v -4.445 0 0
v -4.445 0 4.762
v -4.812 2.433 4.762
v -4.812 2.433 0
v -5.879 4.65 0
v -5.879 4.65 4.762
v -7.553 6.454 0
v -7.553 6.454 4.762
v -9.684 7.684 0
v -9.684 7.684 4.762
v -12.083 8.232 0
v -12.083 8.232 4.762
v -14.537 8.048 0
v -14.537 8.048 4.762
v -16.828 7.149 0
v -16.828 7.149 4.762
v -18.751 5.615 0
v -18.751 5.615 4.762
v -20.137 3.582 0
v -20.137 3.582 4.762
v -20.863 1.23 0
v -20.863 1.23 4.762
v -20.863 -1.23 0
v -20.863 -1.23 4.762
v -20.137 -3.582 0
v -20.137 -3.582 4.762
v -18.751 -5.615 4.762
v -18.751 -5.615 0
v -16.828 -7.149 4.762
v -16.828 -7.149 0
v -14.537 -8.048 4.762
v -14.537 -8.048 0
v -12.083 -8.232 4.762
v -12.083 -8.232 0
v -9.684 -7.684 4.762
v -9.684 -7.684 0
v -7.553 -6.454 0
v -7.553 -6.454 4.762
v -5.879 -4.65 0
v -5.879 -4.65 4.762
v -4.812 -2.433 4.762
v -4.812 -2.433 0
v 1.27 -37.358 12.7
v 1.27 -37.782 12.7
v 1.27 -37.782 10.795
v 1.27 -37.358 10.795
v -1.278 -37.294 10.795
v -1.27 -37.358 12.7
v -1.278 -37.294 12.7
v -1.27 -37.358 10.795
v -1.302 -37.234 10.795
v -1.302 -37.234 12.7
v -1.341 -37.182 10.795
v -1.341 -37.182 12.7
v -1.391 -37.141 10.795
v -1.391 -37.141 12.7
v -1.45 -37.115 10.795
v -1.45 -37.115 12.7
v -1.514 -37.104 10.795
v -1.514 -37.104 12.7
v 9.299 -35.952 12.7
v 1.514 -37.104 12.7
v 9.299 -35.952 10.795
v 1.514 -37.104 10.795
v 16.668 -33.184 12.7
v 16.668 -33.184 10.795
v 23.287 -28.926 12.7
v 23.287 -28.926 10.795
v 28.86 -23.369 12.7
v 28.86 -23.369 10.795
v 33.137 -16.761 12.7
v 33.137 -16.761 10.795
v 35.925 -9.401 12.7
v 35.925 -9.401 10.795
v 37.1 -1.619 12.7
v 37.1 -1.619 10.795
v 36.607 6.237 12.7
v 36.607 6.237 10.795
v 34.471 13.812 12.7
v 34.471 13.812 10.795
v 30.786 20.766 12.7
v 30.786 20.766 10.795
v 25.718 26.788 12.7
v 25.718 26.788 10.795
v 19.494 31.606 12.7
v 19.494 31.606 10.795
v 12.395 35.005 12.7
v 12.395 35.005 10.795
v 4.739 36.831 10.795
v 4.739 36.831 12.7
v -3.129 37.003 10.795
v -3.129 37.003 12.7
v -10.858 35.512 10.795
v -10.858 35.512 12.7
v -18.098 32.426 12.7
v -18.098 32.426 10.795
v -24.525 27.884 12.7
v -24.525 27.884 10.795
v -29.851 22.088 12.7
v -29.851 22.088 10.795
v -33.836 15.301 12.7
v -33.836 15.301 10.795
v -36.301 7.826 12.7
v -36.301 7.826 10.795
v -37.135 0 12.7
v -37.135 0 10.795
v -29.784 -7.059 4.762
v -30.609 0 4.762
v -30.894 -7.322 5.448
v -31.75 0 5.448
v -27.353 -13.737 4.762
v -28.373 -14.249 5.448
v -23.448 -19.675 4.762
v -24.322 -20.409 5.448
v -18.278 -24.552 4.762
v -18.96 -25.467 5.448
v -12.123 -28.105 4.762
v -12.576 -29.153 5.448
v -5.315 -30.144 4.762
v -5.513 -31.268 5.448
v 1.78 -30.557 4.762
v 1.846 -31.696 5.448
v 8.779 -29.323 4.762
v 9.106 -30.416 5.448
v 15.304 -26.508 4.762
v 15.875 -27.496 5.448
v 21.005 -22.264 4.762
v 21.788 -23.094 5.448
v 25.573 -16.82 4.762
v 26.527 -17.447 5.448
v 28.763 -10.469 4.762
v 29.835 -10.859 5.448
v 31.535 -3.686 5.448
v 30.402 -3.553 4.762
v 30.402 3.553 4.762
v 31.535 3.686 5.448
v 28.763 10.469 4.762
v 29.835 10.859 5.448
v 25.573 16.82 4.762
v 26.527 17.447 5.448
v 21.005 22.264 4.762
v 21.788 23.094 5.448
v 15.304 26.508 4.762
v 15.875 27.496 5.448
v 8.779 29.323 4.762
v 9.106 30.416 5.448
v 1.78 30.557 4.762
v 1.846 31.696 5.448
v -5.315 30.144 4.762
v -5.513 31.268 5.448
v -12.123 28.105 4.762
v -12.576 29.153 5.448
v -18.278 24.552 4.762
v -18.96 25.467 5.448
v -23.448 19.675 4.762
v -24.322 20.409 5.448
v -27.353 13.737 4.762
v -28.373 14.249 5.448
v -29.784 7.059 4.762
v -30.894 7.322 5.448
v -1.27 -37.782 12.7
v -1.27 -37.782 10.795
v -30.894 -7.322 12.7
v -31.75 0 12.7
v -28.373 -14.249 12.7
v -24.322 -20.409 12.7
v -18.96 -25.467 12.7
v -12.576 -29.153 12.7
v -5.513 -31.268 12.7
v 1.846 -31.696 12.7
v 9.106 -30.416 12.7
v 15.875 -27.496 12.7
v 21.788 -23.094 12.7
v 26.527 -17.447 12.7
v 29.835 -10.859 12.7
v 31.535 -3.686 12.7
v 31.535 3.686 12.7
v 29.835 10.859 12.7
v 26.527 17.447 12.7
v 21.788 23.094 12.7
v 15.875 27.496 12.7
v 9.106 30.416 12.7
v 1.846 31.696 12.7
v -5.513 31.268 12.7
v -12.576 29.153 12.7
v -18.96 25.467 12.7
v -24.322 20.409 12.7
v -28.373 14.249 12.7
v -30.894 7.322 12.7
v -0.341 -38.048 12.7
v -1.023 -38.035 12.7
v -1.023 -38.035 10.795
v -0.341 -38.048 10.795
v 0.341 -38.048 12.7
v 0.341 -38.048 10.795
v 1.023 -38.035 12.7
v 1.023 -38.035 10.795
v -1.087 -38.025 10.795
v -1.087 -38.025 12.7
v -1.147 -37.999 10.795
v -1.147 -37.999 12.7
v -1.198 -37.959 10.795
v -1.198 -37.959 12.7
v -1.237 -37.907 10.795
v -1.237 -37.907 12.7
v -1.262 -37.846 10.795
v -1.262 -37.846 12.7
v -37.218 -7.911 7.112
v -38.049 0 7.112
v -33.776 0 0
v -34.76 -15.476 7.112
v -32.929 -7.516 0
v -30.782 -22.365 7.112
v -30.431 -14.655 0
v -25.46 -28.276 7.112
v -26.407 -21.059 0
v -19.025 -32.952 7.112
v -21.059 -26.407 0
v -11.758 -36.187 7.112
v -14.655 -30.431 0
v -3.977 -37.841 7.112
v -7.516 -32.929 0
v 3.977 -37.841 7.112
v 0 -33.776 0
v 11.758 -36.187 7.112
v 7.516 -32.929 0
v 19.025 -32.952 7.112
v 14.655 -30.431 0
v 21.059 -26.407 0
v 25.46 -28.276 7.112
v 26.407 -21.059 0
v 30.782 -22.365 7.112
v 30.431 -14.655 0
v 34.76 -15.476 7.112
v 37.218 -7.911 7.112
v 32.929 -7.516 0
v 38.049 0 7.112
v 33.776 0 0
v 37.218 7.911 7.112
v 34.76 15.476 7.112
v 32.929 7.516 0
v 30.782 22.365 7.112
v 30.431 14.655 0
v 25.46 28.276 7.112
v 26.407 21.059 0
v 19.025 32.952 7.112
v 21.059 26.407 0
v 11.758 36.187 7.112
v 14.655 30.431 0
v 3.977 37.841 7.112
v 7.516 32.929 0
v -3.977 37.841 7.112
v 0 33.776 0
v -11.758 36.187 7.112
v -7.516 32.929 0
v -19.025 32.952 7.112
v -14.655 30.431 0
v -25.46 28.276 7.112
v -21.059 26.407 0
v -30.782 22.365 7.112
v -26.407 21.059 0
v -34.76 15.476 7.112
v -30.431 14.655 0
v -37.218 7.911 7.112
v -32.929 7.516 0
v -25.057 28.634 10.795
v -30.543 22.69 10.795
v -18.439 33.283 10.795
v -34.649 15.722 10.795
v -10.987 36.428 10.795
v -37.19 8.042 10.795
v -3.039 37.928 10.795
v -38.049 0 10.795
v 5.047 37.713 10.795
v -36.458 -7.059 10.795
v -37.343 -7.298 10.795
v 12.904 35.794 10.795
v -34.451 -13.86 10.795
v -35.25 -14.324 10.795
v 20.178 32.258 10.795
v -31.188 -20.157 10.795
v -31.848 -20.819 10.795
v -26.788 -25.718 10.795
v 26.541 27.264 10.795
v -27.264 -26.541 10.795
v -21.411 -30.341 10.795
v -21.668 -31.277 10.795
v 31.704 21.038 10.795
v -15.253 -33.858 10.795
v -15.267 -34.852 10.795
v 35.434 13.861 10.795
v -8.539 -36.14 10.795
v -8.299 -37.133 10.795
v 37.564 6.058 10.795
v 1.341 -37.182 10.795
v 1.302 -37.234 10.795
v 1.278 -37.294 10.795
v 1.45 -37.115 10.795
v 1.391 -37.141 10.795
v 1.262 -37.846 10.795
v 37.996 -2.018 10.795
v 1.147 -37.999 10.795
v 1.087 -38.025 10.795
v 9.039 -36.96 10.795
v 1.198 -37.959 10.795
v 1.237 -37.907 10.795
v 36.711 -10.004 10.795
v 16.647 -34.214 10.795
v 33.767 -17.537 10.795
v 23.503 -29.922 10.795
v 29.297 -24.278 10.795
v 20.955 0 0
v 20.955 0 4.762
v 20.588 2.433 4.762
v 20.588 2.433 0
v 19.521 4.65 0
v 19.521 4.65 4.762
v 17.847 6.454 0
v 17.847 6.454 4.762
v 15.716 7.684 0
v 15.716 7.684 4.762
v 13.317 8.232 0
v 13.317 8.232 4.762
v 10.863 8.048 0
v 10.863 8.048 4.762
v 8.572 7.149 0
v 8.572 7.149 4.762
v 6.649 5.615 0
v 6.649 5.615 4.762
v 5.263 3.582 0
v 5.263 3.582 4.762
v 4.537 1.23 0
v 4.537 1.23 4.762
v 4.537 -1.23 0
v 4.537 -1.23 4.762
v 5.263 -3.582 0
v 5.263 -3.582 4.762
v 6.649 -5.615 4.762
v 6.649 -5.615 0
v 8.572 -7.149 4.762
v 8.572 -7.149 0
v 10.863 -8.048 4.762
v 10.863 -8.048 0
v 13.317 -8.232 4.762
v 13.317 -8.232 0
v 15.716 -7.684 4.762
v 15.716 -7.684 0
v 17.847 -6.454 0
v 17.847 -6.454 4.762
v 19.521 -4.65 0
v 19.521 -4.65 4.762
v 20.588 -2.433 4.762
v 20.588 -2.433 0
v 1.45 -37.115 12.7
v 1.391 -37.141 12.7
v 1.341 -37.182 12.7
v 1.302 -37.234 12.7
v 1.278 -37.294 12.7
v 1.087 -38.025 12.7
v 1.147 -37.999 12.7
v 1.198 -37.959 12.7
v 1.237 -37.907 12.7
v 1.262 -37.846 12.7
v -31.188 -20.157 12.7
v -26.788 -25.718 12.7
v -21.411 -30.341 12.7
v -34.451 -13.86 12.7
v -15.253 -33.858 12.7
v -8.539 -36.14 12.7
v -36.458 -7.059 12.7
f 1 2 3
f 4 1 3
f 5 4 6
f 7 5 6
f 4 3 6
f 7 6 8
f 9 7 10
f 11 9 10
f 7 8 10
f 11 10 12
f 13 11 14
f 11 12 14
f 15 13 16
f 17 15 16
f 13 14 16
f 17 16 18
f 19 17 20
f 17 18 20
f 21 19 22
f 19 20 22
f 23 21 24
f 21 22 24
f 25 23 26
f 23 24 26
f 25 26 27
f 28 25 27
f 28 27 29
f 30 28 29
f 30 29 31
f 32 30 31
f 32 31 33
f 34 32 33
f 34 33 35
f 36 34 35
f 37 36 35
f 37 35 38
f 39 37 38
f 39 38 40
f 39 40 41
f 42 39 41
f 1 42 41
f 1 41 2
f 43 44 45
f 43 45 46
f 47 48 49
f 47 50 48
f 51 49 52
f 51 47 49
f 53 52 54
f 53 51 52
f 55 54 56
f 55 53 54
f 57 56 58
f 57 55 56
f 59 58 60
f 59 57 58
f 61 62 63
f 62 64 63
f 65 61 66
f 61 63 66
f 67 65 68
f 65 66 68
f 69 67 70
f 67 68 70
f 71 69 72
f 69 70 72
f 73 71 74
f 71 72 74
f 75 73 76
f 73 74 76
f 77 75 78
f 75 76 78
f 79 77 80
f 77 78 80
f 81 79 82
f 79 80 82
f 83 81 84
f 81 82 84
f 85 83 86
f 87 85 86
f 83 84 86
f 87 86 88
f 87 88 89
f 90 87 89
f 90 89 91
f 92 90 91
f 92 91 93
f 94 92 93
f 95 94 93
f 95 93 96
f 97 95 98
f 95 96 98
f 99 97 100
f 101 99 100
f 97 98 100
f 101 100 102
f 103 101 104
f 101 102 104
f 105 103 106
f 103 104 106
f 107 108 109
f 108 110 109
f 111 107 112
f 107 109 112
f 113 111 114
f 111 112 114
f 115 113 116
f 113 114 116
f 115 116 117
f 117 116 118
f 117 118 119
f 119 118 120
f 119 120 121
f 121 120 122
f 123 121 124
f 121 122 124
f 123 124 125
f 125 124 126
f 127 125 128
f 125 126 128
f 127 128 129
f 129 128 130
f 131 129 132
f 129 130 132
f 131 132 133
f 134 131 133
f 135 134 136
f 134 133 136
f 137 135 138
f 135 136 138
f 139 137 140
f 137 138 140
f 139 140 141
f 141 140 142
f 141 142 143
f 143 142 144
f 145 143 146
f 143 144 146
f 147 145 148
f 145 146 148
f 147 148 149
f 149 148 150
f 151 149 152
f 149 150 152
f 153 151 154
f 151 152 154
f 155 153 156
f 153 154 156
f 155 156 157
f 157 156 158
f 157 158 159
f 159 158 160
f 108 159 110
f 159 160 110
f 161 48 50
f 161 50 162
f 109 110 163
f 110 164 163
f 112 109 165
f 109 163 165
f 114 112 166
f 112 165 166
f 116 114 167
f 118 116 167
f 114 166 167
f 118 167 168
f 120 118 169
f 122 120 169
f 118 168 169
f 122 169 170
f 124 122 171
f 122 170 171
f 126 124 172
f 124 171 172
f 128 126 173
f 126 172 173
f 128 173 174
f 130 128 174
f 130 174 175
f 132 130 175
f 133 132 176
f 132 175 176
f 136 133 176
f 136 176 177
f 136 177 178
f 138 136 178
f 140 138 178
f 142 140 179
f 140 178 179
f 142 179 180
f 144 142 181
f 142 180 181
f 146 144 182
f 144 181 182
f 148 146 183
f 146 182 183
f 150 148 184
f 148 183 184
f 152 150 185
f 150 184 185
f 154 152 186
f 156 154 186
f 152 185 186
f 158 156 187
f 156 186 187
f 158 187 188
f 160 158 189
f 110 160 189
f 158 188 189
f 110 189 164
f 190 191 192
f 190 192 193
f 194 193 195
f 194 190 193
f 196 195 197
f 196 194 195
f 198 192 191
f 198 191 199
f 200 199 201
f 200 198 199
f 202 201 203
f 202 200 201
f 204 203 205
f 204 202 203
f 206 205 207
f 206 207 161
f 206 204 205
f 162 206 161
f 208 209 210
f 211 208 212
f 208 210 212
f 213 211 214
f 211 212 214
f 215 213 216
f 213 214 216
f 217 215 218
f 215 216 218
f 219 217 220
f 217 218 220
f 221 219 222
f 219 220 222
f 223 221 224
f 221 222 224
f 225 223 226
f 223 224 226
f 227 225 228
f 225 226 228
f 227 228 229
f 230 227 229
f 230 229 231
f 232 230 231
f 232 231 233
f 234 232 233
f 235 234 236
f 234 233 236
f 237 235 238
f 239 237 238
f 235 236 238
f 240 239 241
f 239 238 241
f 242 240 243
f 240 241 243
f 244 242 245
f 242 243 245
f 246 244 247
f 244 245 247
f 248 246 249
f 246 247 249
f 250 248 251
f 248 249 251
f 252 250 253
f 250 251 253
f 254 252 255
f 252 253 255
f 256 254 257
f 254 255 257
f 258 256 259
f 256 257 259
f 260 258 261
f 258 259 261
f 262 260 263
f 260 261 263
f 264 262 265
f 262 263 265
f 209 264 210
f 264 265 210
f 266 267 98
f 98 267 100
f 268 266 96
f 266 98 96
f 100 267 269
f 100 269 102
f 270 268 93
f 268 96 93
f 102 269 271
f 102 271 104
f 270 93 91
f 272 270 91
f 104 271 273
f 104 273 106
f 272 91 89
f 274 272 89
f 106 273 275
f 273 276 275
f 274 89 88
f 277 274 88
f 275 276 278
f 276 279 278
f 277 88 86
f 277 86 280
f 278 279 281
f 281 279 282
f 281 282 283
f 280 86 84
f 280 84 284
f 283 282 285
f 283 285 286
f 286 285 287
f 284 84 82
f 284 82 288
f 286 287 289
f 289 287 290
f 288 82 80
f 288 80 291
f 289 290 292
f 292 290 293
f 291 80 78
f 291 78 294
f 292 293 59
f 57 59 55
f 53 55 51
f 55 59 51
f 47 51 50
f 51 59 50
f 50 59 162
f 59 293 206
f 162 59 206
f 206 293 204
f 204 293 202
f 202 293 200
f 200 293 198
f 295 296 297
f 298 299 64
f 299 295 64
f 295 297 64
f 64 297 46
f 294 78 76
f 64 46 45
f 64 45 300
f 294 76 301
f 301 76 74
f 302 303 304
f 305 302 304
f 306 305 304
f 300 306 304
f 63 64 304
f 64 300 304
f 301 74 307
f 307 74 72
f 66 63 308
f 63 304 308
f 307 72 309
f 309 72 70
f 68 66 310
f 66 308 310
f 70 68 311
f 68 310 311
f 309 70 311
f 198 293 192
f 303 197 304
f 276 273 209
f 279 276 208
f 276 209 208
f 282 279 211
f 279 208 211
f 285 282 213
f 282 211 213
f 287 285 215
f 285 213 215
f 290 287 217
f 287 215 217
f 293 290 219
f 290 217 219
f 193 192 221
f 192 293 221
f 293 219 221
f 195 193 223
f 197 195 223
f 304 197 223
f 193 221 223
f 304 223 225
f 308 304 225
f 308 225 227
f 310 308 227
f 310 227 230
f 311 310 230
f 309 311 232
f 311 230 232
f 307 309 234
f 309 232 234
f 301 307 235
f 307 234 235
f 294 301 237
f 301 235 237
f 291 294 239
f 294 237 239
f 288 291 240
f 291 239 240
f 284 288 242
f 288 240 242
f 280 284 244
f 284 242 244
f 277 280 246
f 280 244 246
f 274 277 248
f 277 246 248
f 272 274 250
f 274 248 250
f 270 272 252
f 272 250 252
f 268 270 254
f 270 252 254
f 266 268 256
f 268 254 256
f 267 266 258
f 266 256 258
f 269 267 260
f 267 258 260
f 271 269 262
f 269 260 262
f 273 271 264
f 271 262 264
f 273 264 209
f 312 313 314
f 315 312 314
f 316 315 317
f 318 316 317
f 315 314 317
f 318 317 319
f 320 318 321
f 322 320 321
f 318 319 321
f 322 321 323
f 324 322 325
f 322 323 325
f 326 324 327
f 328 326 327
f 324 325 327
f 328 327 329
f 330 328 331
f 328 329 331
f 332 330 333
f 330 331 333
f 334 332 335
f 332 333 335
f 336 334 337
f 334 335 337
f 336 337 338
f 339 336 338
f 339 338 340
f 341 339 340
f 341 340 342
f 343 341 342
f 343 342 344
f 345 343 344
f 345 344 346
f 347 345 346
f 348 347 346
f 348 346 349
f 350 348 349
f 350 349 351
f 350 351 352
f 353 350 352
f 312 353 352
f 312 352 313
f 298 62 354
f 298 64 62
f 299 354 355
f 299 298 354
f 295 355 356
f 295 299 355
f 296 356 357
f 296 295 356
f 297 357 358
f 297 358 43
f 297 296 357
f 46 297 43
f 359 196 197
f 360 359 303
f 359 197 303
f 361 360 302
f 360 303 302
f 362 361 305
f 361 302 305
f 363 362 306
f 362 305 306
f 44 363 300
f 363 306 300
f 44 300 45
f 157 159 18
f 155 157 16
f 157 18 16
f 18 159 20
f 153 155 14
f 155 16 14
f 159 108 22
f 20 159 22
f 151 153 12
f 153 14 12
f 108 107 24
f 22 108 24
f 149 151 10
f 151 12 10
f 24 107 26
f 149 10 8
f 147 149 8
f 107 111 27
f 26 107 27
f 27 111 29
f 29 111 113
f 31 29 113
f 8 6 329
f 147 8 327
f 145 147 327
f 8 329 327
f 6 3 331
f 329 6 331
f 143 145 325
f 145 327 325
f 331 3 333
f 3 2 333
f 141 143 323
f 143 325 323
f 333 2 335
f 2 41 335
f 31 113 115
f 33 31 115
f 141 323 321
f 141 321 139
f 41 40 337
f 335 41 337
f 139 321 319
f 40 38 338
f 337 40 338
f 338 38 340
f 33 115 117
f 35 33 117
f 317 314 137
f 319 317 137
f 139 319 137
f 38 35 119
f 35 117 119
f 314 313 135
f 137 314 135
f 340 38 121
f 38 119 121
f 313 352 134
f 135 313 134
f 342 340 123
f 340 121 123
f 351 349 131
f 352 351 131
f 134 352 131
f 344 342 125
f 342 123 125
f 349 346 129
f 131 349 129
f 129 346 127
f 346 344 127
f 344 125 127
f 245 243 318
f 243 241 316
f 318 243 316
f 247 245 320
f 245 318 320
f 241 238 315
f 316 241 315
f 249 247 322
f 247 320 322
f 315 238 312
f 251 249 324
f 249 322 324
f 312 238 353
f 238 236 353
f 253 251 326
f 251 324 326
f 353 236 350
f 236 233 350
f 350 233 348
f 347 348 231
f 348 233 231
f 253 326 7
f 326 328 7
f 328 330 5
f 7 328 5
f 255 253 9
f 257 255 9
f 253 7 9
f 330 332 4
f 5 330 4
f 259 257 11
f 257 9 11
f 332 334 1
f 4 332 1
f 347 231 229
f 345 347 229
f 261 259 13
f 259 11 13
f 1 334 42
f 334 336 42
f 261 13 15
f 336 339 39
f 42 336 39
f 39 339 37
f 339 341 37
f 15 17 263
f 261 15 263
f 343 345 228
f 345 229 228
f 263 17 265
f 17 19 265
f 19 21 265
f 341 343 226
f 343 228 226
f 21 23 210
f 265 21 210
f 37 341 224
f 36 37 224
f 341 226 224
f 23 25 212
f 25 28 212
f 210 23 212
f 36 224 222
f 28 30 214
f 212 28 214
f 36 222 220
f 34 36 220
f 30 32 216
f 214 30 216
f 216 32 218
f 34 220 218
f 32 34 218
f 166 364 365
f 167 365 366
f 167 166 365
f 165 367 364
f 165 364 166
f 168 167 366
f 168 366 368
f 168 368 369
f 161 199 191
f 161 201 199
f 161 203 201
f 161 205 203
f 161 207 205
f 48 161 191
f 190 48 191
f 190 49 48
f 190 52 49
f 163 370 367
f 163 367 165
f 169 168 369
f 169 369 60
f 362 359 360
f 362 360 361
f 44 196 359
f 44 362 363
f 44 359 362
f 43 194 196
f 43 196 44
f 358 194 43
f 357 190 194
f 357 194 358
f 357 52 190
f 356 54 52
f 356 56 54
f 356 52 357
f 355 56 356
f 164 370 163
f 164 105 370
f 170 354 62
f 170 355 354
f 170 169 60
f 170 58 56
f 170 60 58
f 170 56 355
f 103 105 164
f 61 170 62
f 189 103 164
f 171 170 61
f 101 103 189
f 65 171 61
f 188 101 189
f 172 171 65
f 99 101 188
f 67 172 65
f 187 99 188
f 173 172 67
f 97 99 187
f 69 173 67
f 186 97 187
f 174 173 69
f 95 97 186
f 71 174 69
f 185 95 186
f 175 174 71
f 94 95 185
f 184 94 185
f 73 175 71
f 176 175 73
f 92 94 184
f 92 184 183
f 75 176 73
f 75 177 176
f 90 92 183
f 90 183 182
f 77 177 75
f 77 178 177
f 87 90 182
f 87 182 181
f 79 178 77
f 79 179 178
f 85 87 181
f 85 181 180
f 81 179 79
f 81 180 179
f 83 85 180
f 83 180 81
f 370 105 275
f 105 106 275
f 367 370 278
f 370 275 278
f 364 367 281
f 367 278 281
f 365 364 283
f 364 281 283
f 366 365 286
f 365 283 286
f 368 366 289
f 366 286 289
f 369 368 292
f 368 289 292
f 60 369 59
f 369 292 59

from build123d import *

# Parameters (mm, degrees)
F2_R     = 8.255
F3_DEPTH = 25.4
F5_DEPTH = 1.905
F6_R     = 0.254


with BuildPart() as f1:
    # F0 (on Front) → F1 (revolve)
    with BuildSketch(Plane.XZ):
        Polygon((-33.775879, 0), (0, 0), (0, 4.7625), (-30.608637, 4.7625), (-31.75, 5.4483), (-31.75, 12.7), (-37.1348, 12.7), (-37.1348, 10.795), (-38.0492, 10.795), (-38.0492, 7.112), align=None)
    revolve(axis=Axis((0, 0, 2.38125), (0, 0, 1)))

    # F2 (on face) → F3 (cut)
    with BuildSketch(Plane.XY.offset(4.7625)):
        with Locations((-12.7, 0)):
            Circle(F2_R)
        with Locations((12.7, 0)):
            Circle(F2_R)
    extrude(amount=-F3_DEPTH, mode=Mode.SUBTRACT)

    # F4 (on face) → F5 (join, through all)
    with BuildSketch(Plane.XY.offset(12.7)):
        with BuildLine():
            ThreePointArc((1.27, -37.113077), (0, -37.1348), (-1.27, -37.113077))
            Line((-1.27, -37.113077), (-1.27, -38.027999))
            ThreePointArc((-1.27, -38.027999), (0, -38.0492), (1.27, -38.027999))
            Line((1.27, -38.027999), (1.27, -37.113077))
        make_face()
    extrude(amount=-F5_DEPTH)

    # F6
    f6_edges = [f1.edges().sort_by_distance(p)[0] for p in [
        (1.27, -37.113077, 11.7475),
        (1.27, -38.027999, 11.7475),
        (-1.27, -38.027999, 11.7475),
        (-1.27, -37.113077, 11.7475),
    ]]
    fillet(f6_edges, radius=F6_R)


solid = f1.part
